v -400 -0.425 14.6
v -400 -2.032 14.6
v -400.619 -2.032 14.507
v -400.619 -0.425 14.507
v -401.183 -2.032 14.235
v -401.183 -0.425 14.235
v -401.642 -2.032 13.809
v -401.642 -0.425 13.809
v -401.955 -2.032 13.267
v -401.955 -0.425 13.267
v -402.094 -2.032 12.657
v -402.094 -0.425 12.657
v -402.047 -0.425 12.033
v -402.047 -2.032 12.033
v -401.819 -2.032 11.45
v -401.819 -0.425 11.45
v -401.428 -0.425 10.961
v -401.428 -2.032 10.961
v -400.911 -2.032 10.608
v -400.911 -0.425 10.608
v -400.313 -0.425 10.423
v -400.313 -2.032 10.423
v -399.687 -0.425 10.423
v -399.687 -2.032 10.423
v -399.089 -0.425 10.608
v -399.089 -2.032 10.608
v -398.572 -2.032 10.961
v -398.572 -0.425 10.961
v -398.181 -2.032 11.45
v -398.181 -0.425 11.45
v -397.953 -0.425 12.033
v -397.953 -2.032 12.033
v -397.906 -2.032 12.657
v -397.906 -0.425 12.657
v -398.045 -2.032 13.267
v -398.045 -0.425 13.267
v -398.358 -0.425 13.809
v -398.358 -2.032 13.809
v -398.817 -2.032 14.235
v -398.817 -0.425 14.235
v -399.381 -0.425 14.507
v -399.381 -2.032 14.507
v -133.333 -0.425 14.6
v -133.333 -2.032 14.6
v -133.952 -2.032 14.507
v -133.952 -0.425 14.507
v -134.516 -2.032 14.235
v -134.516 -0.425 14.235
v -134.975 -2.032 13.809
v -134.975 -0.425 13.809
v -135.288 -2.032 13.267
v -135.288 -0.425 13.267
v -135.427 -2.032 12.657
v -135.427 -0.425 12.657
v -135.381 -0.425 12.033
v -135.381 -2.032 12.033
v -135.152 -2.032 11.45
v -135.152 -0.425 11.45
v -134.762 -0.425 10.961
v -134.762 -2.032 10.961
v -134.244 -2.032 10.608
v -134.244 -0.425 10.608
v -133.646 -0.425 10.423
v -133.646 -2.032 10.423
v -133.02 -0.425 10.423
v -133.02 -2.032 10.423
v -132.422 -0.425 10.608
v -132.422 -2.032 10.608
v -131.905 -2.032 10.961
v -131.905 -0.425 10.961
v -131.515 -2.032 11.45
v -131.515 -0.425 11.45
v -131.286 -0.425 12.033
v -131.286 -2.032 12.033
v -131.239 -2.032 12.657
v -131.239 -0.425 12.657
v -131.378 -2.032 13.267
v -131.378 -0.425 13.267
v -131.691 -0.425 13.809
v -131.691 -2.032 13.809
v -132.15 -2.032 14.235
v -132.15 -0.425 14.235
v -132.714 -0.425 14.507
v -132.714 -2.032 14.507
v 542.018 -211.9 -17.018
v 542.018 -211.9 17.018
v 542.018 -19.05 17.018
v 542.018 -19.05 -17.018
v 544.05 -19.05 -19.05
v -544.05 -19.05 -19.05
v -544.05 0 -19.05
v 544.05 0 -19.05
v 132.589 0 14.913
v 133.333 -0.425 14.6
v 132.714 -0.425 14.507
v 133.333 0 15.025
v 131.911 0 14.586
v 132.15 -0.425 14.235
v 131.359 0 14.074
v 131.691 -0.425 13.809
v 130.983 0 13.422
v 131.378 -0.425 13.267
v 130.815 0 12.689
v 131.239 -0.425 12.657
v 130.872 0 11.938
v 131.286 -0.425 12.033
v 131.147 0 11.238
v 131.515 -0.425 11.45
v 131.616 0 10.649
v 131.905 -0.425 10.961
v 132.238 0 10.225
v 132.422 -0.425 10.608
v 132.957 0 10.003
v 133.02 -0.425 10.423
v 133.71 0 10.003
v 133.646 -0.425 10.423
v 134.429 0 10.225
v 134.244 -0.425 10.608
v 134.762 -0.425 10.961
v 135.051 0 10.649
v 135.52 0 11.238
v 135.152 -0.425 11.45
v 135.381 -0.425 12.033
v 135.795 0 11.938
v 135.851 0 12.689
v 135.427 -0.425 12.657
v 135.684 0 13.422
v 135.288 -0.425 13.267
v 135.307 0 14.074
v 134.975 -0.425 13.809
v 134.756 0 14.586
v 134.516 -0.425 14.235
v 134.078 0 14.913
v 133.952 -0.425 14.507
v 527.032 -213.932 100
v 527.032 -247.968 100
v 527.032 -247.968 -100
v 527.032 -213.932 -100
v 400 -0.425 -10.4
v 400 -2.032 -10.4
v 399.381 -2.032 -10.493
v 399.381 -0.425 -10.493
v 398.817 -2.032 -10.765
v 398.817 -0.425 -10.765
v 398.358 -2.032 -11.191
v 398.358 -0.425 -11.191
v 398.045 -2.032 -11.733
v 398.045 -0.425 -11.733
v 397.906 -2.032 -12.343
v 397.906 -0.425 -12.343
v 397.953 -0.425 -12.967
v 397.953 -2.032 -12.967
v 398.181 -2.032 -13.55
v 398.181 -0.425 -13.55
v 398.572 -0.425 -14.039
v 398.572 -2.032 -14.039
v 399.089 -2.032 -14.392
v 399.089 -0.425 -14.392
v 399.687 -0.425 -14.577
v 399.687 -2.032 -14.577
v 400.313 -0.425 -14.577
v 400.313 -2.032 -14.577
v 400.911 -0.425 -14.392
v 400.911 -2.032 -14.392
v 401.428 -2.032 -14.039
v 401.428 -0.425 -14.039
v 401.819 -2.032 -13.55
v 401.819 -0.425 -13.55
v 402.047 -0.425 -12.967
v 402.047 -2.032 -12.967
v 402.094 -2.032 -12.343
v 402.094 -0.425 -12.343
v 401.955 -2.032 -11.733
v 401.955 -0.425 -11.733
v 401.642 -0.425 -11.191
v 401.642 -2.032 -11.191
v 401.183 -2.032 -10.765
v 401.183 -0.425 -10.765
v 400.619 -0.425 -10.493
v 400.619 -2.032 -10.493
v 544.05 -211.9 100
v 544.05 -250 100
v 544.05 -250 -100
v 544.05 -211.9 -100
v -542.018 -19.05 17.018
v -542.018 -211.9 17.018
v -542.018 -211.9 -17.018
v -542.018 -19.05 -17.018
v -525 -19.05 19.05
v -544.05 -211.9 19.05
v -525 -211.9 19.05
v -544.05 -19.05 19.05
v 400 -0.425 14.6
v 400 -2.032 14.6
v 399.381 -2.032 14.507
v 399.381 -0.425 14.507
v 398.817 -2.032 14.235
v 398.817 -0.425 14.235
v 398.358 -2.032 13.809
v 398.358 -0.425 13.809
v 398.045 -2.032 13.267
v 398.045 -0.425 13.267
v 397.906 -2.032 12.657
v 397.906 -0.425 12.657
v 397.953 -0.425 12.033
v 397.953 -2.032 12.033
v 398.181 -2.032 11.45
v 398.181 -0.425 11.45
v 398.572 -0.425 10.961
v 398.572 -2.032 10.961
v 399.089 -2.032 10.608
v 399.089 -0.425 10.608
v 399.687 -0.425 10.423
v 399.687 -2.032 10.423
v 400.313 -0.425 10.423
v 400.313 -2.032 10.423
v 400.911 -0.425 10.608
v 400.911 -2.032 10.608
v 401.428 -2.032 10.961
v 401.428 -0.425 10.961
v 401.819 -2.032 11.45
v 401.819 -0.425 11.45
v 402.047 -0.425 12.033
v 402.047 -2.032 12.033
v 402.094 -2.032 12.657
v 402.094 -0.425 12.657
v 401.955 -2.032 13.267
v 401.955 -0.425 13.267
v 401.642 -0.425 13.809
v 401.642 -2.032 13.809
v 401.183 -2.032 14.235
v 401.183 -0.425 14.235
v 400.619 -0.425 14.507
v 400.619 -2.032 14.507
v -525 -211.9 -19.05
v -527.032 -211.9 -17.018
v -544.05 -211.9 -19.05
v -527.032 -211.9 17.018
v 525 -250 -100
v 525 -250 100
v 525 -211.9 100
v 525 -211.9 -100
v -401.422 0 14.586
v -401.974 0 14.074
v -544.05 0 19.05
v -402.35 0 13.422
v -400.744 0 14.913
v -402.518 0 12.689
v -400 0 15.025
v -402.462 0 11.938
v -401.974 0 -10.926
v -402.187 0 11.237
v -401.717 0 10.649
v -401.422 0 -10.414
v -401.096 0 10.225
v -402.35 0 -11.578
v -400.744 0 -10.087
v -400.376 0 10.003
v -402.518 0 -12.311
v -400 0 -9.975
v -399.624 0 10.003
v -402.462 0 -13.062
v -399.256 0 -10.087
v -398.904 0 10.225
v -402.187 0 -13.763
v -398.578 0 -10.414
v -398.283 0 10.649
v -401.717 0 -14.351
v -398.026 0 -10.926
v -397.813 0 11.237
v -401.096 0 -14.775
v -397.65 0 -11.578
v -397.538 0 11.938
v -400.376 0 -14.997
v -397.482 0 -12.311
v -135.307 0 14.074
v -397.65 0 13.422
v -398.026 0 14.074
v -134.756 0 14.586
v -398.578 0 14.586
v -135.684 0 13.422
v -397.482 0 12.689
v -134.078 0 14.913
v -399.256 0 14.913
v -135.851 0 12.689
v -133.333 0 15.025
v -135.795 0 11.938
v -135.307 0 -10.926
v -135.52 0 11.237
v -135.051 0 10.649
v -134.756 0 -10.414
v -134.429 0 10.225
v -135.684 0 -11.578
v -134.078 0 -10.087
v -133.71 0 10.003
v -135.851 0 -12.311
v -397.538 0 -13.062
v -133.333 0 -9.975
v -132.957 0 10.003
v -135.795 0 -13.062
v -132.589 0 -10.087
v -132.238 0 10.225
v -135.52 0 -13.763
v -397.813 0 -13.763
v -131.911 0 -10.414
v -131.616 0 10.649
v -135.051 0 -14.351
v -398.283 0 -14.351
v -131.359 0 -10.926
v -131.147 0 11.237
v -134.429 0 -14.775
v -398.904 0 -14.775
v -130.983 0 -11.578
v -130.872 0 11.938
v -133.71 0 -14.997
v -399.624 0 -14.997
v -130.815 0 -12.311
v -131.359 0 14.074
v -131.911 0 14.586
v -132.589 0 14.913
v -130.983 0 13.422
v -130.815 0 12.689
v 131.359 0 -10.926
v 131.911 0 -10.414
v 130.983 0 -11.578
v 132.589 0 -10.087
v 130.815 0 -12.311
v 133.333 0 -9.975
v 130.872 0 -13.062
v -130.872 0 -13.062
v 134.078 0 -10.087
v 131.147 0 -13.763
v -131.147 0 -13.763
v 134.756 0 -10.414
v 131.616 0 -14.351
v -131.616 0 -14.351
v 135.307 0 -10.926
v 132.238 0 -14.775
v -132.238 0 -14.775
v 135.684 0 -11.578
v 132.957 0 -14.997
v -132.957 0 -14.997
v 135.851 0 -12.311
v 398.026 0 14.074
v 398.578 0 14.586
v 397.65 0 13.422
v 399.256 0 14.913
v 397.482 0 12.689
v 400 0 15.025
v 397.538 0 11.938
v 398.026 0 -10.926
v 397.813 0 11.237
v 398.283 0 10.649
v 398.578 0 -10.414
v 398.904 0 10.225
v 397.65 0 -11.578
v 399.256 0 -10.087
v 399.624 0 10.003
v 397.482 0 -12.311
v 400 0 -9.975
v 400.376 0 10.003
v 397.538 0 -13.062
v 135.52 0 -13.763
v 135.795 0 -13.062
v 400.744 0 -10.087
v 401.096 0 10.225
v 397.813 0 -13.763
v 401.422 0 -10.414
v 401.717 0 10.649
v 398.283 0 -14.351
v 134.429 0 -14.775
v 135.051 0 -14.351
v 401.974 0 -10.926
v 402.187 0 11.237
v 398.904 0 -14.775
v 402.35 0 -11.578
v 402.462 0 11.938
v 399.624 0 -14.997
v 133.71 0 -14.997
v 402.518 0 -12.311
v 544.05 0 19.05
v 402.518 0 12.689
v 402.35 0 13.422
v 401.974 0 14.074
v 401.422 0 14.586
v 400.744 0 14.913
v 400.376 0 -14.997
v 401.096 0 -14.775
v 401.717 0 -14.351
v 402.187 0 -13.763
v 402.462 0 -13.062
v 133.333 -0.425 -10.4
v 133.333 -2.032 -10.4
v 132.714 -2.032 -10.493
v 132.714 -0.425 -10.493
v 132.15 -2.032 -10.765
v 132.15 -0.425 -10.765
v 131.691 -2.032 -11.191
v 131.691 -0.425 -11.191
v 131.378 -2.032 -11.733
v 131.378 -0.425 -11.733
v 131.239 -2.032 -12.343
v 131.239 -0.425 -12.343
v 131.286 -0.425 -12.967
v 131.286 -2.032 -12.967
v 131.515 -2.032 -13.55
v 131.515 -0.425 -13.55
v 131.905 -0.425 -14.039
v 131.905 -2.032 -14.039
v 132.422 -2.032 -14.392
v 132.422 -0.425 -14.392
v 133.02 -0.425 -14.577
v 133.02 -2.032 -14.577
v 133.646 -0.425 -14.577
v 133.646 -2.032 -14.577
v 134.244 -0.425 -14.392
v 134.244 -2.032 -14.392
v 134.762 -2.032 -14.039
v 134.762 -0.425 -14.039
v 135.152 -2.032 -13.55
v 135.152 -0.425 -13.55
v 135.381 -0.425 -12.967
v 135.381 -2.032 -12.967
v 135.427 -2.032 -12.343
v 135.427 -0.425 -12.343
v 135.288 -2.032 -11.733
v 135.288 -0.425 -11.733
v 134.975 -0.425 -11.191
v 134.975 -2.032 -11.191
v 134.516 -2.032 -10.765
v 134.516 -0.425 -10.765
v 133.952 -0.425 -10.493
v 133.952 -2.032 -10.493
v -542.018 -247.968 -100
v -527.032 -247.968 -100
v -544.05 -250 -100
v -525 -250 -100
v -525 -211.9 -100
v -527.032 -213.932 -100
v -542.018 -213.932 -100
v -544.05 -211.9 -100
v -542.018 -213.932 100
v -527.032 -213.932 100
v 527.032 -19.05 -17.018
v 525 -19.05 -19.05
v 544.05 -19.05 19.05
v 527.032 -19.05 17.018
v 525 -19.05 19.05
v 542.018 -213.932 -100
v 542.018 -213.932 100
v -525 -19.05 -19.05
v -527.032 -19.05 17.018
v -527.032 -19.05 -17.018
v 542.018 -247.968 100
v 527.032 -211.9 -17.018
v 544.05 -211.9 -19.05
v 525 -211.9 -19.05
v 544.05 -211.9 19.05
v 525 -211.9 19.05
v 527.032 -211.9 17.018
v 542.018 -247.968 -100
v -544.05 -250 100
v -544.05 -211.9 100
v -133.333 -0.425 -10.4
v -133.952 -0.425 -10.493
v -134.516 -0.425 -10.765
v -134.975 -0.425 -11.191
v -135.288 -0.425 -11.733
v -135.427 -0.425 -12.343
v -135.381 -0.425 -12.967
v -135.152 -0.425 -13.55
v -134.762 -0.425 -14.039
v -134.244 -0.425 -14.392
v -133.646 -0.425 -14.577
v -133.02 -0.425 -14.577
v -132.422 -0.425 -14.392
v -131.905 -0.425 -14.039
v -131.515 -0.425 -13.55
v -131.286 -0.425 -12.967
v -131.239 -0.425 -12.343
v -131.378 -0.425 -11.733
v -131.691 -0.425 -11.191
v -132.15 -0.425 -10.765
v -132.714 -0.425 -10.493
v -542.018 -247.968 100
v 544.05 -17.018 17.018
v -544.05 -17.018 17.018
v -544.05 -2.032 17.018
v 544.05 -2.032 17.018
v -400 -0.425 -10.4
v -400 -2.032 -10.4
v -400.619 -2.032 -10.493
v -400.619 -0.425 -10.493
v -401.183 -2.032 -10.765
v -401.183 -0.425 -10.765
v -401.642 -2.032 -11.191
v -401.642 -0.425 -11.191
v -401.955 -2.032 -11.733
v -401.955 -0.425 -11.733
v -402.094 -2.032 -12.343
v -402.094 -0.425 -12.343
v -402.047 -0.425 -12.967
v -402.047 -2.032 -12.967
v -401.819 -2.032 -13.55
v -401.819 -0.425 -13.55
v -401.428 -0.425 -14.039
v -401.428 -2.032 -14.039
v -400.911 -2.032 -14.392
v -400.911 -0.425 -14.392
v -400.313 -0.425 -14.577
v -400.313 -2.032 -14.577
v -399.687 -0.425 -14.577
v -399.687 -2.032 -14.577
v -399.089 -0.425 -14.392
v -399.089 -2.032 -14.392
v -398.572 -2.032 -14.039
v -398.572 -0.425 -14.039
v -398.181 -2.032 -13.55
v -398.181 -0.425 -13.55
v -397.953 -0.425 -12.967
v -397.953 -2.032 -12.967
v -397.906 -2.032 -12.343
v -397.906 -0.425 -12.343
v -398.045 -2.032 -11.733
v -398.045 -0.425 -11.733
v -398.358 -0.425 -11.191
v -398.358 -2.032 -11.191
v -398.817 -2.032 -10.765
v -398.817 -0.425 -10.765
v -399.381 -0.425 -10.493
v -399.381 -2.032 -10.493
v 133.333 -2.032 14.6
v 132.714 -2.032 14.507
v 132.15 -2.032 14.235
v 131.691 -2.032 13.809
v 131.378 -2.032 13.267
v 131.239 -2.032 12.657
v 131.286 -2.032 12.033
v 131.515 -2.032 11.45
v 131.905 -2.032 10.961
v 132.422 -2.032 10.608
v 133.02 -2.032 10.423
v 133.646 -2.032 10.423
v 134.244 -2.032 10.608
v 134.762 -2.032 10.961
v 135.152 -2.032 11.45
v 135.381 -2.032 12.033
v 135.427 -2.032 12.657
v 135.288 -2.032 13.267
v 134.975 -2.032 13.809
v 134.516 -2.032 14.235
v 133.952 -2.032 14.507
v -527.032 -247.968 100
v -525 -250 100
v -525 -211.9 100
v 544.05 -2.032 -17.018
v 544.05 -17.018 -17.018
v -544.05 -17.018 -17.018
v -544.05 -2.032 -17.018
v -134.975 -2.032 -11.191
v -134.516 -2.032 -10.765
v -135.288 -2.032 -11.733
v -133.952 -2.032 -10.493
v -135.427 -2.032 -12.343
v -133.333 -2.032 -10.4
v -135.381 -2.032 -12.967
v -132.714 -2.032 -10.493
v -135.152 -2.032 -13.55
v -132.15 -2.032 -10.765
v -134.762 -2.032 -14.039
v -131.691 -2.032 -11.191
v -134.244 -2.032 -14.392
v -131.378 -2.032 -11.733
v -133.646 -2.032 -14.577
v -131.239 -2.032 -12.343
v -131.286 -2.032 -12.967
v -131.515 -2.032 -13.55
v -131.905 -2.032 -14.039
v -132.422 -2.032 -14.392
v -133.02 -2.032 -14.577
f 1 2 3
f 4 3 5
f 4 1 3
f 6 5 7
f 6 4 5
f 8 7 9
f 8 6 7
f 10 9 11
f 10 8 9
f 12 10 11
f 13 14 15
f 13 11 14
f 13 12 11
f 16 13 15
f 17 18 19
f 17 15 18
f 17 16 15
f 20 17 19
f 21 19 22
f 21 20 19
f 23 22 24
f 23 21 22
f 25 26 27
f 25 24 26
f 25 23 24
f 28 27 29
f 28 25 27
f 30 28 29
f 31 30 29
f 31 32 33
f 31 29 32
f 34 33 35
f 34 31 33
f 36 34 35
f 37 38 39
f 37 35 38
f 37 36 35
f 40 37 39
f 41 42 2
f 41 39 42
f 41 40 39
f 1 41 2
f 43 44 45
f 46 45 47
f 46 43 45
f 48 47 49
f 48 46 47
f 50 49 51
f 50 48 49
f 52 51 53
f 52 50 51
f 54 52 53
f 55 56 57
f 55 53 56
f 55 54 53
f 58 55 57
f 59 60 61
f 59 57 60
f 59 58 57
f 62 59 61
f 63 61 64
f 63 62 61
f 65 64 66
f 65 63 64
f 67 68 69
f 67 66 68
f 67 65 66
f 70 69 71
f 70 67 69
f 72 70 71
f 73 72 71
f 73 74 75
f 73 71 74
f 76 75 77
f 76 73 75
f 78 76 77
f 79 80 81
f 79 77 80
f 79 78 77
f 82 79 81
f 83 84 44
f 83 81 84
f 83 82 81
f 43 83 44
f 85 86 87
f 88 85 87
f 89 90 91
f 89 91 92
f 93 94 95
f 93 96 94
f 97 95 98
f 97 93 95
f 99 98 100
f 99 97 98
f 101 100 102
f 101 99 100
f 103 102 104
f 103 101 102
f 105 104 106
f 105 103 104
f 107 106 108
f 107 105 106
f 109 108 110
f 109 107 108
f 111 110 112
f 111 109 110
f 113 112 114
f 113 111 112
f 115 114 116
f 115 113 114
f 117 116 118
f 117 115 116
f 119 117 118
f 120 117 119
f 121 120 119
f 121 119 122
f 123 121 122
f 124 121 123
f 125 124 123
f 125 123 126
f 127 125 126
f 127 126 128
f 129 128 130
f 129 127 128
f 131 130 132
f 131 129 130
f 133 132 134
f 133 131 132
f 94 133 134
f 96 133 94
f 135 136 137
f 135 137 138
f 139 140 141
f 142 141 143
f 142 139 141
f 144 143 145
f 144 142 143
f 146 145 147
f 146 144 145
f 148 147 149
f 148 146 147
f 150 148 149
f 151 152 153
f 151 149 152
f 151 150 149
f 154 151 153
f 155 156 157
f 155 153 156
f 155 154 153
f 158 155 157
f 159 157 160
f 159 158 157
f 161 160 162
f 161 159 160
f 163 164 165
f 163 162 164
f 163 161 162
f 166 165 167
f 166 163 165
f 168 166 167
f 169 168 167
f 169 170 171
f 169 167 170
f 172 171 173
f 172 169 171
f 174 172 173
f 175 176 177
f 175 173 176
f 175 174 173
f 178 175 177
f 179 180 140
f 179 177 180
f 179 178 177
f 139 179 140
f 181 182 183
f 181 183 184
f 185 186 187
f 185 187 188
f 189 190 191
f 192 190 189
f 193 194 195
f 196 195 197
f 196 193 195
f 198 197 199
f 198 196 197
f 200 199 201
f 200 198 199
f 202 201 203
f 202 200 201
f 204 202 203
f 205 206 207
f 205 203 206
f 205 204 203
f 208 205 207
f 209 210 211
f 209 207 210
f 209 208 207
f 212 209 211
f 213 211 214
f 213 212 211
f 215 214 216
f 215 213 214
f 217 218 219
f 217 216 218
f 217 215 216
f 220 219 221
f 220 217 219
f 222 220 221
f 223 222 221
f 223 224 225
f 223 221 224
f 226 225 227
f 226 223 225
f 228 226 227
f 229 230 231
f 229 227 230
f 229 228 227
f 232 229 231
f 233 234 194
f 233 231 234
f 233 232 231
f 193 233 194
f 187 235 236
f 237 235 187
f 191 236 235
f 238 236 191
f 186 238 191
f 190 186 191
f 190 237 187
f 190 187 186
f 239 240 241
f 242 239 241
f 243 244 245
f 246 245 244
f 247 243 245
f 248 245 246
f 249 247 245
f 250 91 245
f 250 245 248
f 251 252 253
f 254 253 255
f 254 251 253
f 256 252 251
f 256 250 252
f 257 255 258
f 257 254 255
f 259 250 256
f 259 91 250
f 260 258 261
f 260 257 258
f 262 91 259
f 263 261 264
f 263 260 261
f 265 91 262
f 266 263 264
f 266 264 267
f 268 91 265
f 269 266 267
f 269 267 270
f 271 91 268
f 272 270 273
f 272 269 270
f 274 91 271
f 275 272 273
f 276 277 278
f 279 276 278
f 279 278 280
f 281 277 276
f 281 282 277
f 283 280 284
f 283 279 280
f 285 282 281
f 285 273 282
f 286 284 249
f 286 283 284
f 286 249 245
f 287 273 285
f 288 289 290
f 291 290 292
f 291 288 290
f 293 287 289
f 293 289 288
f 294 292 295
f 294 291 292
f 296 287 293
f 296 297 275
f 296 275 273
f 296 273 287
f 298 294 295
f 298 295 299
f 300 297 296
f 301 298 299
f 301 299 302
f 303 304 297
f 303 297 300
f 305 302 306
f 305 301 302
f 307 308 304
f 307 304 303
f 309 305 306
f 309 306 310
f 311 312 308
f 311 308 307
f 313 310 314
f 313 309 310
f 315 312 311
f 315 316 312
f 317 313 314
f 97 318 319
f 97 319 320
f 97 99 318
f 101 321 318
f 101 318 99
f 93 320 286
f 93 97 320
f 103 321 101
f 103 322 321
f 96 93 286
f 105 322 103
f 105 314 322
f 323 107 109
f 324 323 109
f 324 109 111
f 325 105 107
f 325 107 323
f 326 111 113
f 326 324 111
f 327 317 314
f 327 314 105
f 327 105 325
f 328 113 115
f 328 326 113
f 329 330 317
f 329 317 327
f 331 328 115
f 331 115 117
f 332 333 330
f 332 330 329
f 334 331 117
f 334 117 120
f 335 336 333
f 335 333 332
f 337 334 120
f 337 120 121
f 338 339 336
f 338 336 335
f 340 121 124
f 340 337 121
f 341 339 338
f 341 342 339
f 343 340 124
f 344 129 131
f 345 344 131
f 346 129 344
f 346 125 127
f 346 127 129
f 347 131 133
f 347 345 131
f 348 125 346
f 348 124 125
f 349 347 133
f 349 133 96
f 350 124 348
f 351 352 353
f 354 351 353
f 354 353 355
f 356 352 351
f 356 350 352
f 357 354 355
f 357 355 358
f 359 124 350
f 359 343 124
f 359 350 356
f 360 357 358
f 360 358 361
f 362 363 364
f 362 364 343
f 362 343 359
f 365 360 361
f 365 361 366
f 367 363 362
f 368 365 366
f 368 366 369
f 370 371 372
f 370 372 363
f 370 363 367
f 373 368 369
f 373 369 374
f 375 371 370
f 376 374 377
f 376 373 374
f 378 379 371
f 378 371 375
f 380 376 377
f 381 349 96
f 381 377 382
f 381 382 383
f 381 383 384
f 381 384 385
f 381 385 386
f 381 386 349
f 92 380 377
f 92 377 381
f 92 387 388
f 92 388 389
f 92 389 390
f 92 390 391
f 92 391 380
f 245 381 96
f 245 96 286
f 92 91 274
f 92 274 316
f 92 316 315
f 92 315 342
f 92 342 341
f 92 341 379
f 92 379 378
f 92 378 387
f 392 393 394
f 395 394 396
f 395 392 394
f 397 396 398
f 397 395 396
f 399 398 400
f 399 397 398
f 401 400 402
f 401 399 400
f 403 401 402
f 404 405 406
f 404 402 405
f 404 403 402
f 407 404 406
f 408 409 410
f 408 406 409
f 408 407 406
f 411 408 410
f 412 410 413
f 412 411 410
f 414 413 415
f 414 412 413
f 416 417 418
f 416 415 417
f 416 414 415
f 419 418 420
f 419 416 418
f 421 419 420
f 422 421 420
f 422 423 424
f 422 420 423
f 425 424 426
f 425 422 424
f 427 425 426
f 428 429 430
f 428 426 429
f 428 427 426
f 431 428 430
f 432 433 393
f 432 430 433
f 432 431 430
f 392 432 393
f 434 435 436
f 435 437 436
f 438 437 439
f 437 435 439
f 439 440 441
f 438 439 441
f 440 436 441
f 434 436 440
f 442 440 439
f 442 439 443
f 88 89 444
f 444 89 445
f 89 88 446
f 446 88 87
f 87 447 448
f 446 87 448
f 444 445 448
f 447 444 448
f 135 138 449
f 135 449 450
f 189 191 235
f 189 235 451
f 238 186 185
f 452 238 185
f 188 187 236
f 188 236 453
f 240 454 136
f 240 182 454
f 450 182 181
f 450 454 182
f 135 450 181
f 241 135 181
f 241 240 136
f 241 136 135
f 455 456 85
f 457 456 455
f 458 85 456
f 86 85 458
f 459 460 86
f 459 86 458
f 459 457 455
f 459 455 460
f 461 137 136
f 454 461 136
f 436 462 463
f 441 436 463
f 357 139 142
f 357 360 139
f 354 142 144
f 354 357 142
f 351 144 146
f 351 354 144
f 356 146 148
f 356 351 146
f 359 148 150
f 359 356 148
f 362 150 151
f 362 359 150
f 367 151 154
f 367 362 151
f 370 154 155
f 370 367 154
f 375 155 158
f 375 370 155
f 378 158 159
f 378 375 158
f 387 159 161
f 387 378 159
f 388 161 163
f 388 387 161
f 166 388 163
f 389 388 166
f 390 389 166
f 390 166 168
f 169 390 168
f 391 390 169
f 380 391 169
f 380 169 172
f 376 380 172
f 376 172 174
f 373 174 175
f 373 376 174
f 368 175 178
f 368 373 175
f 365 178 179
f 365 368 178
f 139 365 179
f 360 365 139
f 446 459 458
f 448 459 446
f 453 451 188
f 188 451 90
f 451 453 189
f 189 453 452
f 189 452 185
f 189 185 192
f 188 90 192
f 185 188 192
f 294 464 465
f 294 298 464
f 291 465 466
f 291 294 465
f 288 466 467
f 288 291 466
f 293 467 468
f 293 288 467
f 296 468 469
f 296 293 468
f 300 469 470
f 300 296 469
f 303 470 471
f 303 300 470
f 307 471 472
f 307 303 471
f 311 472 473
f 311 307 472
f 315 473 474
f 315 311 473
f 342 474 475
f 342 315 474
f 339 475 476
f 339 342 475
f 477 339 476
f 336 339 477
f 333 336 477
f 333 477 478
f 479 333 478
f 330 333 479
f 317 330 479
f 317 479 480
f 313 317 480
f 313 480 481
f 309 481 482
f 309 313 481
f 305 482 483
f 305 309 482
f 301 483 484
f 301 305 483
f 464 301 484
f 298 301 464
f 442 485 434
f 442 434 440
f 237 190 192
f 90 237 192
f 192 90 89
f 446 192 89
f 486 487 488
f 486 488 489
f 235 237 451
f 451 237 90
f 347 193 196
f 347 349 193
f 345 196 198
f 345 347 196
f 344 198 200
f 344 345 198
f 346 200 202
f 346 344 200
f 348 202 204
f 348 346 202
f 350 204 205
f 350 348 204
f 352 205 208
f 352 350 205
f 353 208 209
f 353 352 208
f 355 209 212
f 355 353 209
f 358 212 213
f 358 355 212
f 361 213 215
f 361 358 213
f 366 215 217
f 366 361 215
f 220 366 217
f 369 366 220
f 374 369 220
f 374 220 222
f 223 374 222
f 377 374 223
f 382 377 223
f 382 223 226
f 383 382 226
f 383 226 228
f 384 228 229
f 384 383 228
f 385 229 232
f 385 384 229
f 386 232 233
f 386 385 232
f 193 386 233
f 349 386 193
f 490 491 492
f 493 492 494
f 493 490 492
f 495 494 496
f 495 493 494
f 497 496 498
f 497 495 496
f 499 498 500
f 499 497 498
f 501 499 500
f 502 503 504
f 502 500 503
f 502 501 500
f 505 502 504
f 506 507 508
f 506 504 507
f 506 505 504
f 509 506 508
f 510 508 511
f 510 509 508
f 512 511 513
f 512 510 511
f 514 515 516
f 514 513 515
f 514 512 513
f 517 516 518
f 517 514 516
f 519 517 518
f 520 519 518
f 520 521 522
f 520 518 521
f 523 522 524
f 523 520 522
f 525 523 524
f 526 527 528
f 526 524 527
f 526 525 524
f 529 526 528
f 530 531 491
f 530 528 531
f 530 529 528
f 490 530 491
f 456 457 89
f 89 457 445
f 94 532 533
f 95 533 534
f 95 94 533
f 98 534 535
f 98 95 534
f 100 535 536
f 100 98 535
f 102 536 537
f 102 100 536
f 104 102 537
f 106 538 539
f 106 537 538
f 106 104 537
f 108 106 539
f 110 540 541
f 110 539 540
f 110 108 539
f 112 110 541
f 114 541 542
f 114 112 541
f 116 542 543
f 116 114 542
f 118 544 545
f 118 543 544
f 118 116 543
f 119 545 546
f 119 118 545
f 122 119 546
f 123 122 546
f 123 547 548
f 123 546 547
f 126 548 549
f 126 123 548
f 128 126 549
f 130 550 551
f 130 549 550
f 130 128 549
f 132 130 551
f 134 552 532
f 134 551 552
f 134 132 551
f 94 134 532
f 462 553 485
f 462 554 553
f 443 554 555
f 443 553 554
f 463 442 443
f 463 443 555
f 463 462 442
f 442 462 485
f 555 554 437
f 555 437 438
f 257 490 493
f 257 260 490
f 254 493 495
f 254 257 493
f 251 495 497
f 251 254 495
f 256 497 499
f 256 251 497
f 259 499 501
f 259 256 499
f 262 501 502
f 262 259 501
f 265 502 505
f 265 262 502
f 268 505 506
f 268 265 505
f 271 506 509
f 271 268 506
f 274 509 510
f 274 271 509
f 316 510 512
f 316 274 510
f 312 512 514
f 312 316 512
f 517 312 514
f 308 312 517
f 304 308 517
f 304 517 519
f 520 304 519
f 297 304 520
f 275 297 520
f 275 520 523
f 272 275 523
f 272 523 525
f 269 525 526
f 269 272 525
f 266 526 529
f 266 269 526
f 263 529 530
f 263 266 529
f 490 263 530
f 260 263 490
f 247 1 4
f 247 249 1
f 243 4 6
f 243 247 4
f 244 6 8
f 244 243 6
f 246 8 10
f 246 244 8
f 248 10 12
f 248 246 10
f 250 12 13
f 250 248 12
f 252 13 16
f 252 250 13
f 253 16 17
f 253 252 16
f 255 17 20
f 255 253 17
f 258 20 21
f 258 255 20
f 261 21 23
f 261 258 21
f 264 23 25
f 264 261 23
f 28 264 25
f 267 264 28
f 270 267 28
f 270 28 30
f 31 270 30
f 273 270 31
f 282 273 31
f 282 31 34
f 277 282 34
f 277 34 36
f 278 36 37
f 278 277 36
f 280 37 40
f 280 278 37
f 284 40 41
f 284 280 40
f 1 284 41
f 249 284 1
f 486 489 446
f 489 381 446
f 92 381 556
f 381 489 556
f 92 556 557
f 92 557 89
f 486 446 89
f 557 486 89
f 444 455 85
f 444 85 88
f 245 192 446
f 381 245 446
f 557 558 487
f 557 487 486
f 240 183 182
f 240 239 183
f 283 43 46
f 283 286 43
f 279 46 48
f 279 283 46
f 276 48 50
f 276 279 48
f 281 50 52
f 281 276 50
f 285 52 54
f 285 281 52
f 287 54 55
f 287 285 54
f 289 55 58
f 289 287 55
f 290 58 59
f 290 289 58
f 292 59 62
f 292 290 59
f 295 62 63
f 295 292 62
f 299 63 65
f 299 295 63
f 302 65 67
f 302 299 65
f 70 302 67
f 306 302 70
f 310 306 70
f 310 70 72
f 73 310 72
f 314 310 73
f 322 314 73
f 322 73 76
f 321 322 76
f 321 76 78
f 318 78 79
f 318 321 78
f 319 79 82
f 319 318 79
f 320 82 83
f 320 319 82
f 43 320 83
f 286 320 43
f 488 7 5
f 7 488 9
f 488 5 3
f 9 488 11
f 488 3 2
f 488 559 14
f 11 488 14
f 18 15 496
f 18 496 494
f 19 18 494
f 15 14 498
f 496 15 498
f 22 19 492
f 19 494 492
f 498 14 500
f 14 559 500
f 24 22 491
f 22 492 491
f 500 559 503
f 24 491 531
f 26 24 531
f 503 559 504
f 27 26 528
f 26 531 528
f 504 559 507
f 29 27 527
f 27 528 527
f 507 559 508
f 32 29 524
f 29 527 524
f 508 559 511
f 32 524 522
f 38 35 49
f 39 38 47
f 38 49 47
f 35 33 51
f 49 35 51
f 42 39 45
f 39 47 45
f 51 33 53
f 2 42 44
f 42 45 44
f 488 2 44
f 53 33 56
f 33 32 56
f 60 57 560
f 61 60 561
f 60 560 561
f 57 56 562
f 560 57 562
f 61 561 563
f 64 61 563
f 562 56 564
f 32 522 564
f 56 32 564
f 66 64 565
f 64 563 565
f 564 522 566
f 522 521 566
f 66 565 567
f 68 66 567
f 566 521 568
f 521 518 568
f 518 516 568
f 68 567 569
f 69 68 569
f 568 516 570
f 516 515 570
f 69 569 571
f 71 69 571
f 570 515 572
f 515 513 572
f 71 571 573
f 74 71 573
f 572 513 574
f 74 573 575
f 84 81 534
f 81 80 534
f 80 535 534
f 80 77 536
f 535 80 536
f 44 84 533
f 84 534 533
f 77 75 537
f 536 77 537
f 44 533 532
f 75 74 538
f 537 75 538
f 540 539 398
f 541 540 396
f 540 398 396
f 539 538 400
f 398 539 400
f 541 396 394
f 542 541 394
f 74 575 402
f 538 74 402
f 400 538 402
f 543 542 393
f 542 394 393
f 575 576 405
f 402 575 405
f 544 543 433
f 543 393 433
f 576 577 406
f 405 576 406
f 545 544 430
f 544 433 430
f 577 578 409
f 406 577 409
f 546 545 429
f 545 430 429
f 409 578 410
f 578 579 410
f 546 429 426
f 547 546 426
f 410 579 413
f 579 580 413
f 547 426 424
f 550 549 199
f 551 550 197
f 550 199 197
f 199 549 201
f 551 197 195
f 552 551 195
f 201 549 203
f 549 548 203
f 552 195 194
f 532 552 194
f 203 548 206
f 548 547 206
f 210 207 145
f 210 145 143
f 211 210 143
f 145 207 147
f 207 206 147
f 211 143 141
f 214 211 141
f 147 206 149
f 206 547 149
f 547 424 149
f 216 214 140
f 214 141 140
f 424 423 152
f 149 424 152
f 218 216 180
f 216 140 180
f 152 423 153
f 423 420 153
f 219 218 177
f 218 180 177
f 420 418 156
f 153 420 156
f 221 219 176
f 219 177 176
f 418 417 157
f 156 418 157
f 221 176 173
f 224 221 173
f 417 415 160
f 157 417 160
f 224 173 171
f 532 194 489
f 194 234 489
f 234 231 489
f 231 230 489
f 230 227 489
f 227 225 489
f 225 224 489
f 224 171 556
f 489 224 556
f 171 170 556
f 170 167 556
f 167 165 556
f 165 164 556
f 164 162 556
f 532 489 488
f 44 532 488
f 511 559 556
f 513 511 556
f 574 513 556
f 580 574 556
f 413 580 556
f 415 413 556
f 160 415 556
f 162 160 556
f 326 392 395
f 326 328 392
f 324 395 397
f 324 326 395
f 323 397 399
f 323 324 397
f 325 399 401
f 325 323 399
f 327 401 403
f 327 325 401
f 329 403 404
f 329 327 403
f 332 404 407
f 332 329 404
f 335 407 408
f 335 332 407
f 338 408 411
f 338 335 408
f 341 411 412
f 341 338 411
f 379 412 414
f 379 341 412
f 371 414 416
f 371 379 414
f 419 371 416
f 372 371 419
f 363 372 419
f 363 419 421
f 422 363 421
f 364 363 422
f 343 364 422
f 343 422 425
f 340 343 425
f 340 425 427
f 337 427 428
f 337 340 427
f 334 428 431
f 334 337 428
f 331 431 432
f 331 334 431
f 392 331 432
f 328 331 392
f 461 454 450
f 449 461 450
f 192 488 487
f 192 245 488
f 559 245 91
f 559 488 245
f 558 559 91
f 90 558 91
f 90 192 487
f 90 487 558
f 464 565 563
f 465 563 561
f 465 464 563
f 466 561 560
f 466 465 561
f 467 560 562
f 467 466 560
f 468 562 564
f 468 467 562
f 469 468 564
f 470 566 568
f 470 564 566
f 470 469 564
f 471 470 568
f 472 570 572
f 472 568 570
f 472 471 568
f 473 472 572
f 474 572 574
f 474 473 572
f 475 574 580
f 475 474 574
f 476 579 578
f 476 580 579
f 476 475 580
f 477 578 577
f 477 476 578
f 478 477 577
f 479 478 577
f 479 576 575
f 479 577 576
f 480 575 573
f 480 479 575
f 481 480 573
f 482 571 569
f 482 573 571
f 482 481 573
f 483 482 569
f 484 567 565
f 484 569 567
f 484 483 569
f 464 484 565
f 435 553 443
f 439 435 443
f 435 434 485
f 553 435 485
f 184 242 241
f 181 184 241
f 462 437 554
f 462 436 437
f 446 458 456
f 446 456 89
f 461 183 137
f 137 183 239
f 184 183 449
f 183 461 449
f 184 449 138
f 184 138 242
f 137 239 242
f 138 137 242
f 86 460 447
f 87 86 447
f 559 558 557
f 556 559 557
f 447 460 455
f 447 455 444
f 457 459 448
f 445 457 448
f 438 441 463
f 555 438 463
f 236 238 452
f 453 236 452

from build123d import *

# Parameters (mm, degrees)
AL_START                                       = -544.05
AL_TUBE_RECTANGULAR_AL_TUBE_3_X_1_5_2_W        = 192.85
AL_TUBE_RECTANGULAR_AL_TUBE_3_X_1_5_2_H        = 38.1
AL_TUBE_RECTANGULAR_AL_TUBE_3_X_1_5_RECT_DEPTH = 2.032
AL_START_2                                     = -527.032
AL_TUBE_RECTANGULAR_AL_TUBE_3_X_1_5_3_OU_W     = 192.85
AL_TUBE_RECTANGULAR_AL_TUBE_3_X_1_5_3_OU_H     = 38.1
AL_TUBE_RECTANGULAR_AL_TUBE_3_X_1_5_3_DEPTH    = 2.032
AL_START_3                                     = -542.018
AL_TUBE_RECTANGULAR_AL_TUBE_3_X_1_5_4_OU_W     = 192.85
AL_TUBE_RECTANGULAR_AL_TUBE_3_X_1_5_4_OU_H     = 2.032
AL_TUBE_RECTANGULAR_AL_TUBE_3_X_1_5_4_DEPTH    = 14.986
AL_START_4                                     = -19.05
AL_TUBE_RECTANGULAR_AL_TUBE_3_X_1_5_5_OU_W     = 1088.1
AL_TUBE_RECTANGULAR_AL_TUBE_3_X_1_5_5_OU_H     = 38.1
AL_TUBE_RECTANGULAR_AL_TUBE_3_X_1_5_5_DEPTH    = 2.032
AL_START_5                                     = -2.032
AL_TUBE_RECTANGULAR_AL_TUBE_3_X_1_5_6_OU_W     = 1088.1
AL_TUBE_RECTANGULAR_AL_TUBE_3_X_1_5_6_OU_H     = 38.1
AL_TUBE_RECTANGULAR_AL_TUBE_3_X_1_5_6_DEPTH    = 2.032
AL_START_6                                     = -17.018
AL_TUBE_RECTANGULAR_AL_TUBE_3_X_1_5_7_OU_W     = 1088.1
AL_TUBE_RECTANGULAR_AL_TUBE_3_X_1_5_7_OU_H     = 2.032
AL_TUBE_RECTANGULAR_AL_TUBE_3_X_1_5_7_DEPTH    = 14.986
AL_START_7                                     = 525
AL_TUBE_RECTANGULAR_AL_TUBE_3_X_1_5_8_OU_W     = 192.85
AL_TUBE_RECTANGULAR_AL_TUBE_3_X_1_5_8_OU_H     = 38.1
AL_TUBE_RECTANGULAR_AL_TUBE_3_X_1_5_8_DEPTH    = 2.032
AL_START_8                                     = 542.018
AL_TUBE_RECTANGULAR_AL_TUBE_3_X_1_5_9_OU_W     = 192.85
AL_TUBE_RECTANGULAR_AL_TUBE_3_X_1_5_9_OU_H     = 38.1
AL_TUBE_RECTANGULAR_AL_TUBE_3_X_1_5_9_DEPTH    = 2.032
AL_START_9                                     = 527.032
AL_TUBE_RECTANGULAR_AL_TUBE_3_X_1_5_10_O_W     = 192.85
AL_TUBE_RECTANGULAR_AL_TUBE_3_X_1_5_10_O_H     = 2.032
AL_TUBE_RECTANGULAR_AL_TUBE_3_X_1_5_10_DEPTH   = 14.986
AL_TUBE_RECTANGULAR_AL_TUBE_3_X_1_5_11_O_W     = 38.1
AL_TUBE_RECTANGULAR_AL_TUBE_3_X_1_5_11_O_H     = 200
AL_TUBE_RECTANGULAR_AL_TUBE_3_X_1_5_11_DEPTH   = 2.032
AL_TUBE_RECTANGULAR_AL_TUBE_3_X_1_5_12_O_W     = 38.1
AL_TUBE_RECTANGULAR_AL_TUBE_3_X_1_5_12_O_H     = 200
AL_TUBE_RECTANGULAR_AL_TUBE_3_X_1_5_12_DEPTH   = 2.032
AL_TUBE_RECTANGULAR_AL_TUBE_3_X_1_5_13_O_W     = 2.032
AL_TUBE_RECTANGULAR_AL_TUBE_3_X_1_5_13_O_H     = 200
AL_TUBE_RECTANGULAR_AL_TUBE_3_X_1_5_13_DEPTH   = 14.986
AL_TUBE_RECTANGULAR_AL_TUBE_3_X_1_5_14_O_W     = 38.1
AL_TUBE_RECTANGULAR_AL_TUBE_3_X_1_5_14_O_H     = 200
AL_TUBE_RECTANGULAR_AL_TUBE_3_X_1_5_14_DEPTH   = 2.032
AL_TUBE_RECTANGULAR_AL_TUBE_3_X_1_5_15_O_W     = 38.1
AL_TUBE_RECTANGULAR_AL_TUBE_3_X_1_5_15_O_H     = 200
AL_TUBE_RECTANGULAR_AL_TUBE_3_X_1_5_15_DEPTH   = 2.032
AL_TUBE_RECTANGULAR_AL_TUBE_3_X_1_5_16_O_W     = 2.032
AL_TUBE_RECTANGULAR_AL_TUBE_3_X_1_5_16_O_H     = 200
AL_TUBE_RECTANGULAR_AL_TUBE_3_X_1_5_16_DEPTH   = 14.986
TROU_TARAUD_M5X0_81_AT_2_COUNT                 = 2
TROU_TARAUD_M5X0_81_AT_2_PITCH                 = 800
TROU_TARAUD_M5X0_81_AT_3_COUNT                 = 2
TROU_TARAUD_M5X0_81_AT_3_PITCH                 = 800.390529679
TROU_TARAUD_M5X0_81_AT_4_COUNT                 = 2
TROU_TARAUD_M5X0_81_AT_4_PITCH                 = 533.918949321
TROU_TARAUD_M5X0_81_AT_5_COUNT                 = 2
TROU_TARAUD_M5X0_81_AT_5_PITCH                 = 533.333333333
TROU_TARAUD_M5X0_81_AT_6_COUNT                 = 2
TROU_TARAUD_M5X0_81_AT_6_PITCH                 = 266.666666667
TROU_TARAUD_M5X0_81_AT_7_COUNT                 = 2
TROU_TARAUD_M5X0_81_AT_7_PITCH                 = 267.835978
TROU_TARAUD_M5X0_81_AT_8_COUNT                 = 2
TROU_TARAUD_M5X0_81_AT_8_PITCH                 = 25


# Read off the part's stored shape, not the designer's step: Al tube rectangular AL TUBE 3 X 1.5 RECT X 0.104 WALL(4)
with BuildPart() as part:
    # Al tube rectangular AL TUBE 3 X 1.5  2 → Al tube rectangular AL TUBE 3 X 1.5 RECT X 0.104 WALL(4) (new body)
    with BuildSketch(Plane.YZ.offset(AL_START)):
        with Locations((-115.475, 0)):
            Rectangle(AL_TUBE_RECTANGULAR_AL_TUBE_3_X_1_5_2_W, AL_TUBE_RECTANGULAR_AL_TUBE_3_X_1_5_2_H)
    extrude(amount=AL_TUBE_RECTANGULAR_AL_TUBE_3_X_1_5_RECT_DEPTH)

    # Al tube rectangular AL TUBE 3 X 1.5 3 ou → Al tube rectangular AL TUBE 3 X 1.5  3 (add)
    with BuildSketch(Plane.YZ.offset(AL_START_2)):
        with Locations((-115.475, 0)):
            Rectangle(AL_TUBE_RECTANGULAR_AL_TUBE_3_X_1_5_3_OU_W, AL_TUBE_RECTANGULAR_AL_TUBE_3_X_1_5_3_OU_H)
    extrude(amount=AL_TUBE_RECTANGULAR_AL_TUBE_3_X_1_5_3_DEPTH)

    # Al tube rectangular AL TUBE 3 X 1.5 4 ou → Al tube rectangular AL TUBE 3 X 1.5  4 (add)
    with BuildSketch(Plane.YZ.offset(AL_START_3)):
        with Locations((-115.475, 18.034)):
            Rectangle(AL_TUBE_RECTANGULAR_AL_TUBE_3_X_1_5_4_OU_W, AL_TUBE_RECTANGULAR_AL_TUBE_3_X_1_5_4_OU_H)
        with Locations((-115.475, -18.034)):
            Rectangle(AL_TUBE_RECTANGULAR_AL_TUBE_3_X_1_5_4_OU_W, AL_TUBE_RECTANGULAR_AL_TUBE_3_X_1_5_4_OU_H)
    extrude(amount=AL_TUBE_RECTANGULAR_AL_TUBE_3_X_1_5_4_DEPTH)


with BuildPart() as body_2:
    # Al tube rectangular AL TUBE 3 X 1.5 5 ou → Al tube rectangular AL TUBE 3 X 1.5  5 (new body)
    with BuildSketch(Plane(origin=(0, 0, 0), x_dir=(1, 0, 0), z_dir=(0, 1, 0)).offset(AL_START_4)):
        Rectangle(AL_TUBE_RECTANGULAR_AL_TUBE_3_X_1_5_5_OU_W, AL_TUBE_RECTANGULAR_AL_TUBE_3_X_1_5_5_OU_H)
    extrude(amount=AL_TUBE_RECTANGULAR_AL_TUBE_3_X_1_5_5_DEPTH)

    # Al tube rectangular AL TUBE 3 X 1.5 6 ou → Al tube rectangular AL TUBE 3 X 1.5  6 (add)
    with BuildSketch(Plane(origin=(0, 0, 0), x_dir=(1, 0, 0), z_dir=(0, 1, 0)).offset(AL_START_5)):
        Rectangle(AL_TUBE_RECTANGULAR_AL_TUBE_3_X_1_5_6_OU_W, AL_TUBE_RECTANGULAR_AL_TUBE_3_X_1_5_6_OU_H)
    extrude(amount=AL_TUBE_RECTANGULAR_AL_TUBE_3_X_1_5_6_DEPTH)

    # Al tube rectangular AL TUBE 3 X 1.5 7 ou → Al tube rectangular AL TUBE 3 X 1.5  7 (add)
    with BuildSketch(Plane(origin=(0, 0, 0), x_dir=(1, 0, 0), z_dir=(0, 1, 0)).offset(AL_START_6)):
        with Locations((0, 18.034)):
            Rectangle(AL_TUBE_RECTANGULAR_AL_TUBE_3_X_1_5_7_OU_W, AL_TUBE_RECTANGULAR_AL_TUBE_3_X_1_5_7_OU_H)
        with Locations((0, -18.034)):
            Rectangle(AL_TUBE_RECTANGULAR_AL_TUBE_3_X_1_5_7_OU_W, AL_TUBE_RECTANGULAR_AL_TUBE_3_X_1_5_7_OU_H)
    extrude(amount=AL_TUBE_RECTANGULAR_AL_TUBE_3_X_1_5_7_DEPTH)

    # Esquisse2 → Trou taraudé M5x0.81 (revolve, cut)
    with BuildSketch(Plane(origin=(400, 0, -12.5), x_dir=(0, 0, 1), z_dir=(1, 0, 0))):
        Polygon((0, 0), (0, 2.033), (2.1, 2.033), (2.1, 0.425), (2.525, 0), align=None)
    trou_taraud_m5x0_81 = revolve(axis=Axis((400, 6.35, -12.5), (0, -1, 0)), mode=Mode.SUBTRACT)

    # Trou taraudé M5x0.81 at 2: Trou taraudé M5x0.81 ×2
    with Locations(*[(-i * TROU_TARAUD_M5X0_81_AT_2_PITCH, 0, 0) for i in range(1, TROU_TARAUD_M5X0_81_AT_2_COUNT)]):
        add(trou_taraud_m5x0_81, mode=Mode.SUBTRACT)

    # Trou taraudé M5x0.81 at 3: Trou taraudé M5x0.81 ×2
    with Locations(*[Vector(-0.9995120760870788, 0, 0.031234752377721213) * (i * TROU_TARAUD_M5X0_81_AT_3_PITCH) for i in range(1, TROU_TARAUD_M5X0_81_AT_3_COUNT)]):
        add(trou_taraud_m5x0_81, mode=Mode.SUBTRACT)

    # Trou taraudé M5x0.81 at 4: Trou taraudé M5x0.81 ×2
    with Locations(*[Vector(-0.998903174369838, 0, 0.04682358629858615) * (i * TROU_TARAUD_M5X0_81_AT_4_PITCH) for i in range(1, TROU_TARAUD_M5X0_81_AT_4_COUNT)]):
        add(trou_taraud_m5x0_81, mode=Mode.SUBTRACT)

    # Trou taraudé M5x0.81 at 5: Trou taraudé M5x0.81 ×2
    with Locations(*[(-i * TROU_TARAUD_M5X0_81_AT_5_PITCH, 0, 0) for i in range(1, TROU_TARAUD_M5X0_81_AT_5_COUNT)]):
        add(trou_taraud_m5x0_81, mode=Mode.SUBTRACT)

    # Trou taraudé M5x0.81 at 6: Trou taraudé M5x0.81 ×2
    with Locations(*[(-i * TROU_TARAUD_M5X0_81_AT_6_PITCH, 0, 0) for i in range(1, TROU_TARAUD_M5X0_81_AT_6_COUNT)]):
        add(trou_taraud_m5x0_81, mode=Mode.SUBTRACT)

    # Trou taraudé M5x0.81 at 7: Trou taraudé M5x0.81 ×2
    with Locations(*[Vector(-0.9956342260592882, 0, 0.09334070869305829) * (i * TROU_TARAUD_M5X0_81_AT_7_PITCH) for i in range(1, TROU_TARAUD_M5X0_81_AT_7_COUNT)]):
        add(trou_taraud_m5x0_81, mode=Mode.SUBTRACT)

    # Trou taraudé M5x0.81 at 8: Trou taraudé M5x0.81 ×2
    with Locations(*[(0, 0, i * TROU_TARAUD_M5X0_81_AT_8_PITCH) for i in range(1, TROU_TARAUD_M5X0_81_AT_8_COUNT)]):
        add(trou_taraud_m5x0_81, mode=Mode.SUBTRACT)


with BuildPart() as body_3:
    # Al tube rectangular AL TUBE 3 X 1.5 8 ou → Al tube rectangular AL TUBE 3 X 1.5  8 (new body)
    with BuildSketch(Plane.YZ.offset(AL_START_7)):
        with Locations((-115.475, 0)):
            Rectangle(AL_TUBE_RECTANGULAR_AL_TUBE_3_X_1_5_8_OU_W, AL_TUBE_RECTANGULAR_AL_TUBE_3_X_1_5_8_OU_H)
    extrude(amount=AL_TUBE_RECTANGULAR_AL_TUBE_3_X_1_5_8_DEPTH)

    # Al tube rectangular AL TUBE 3 X 1.5 9 ou → Al tube rectangular AL TUBE 3 X 1.5  9 (add)
    with BuildSketch(Plane.YZ.offset(AL_START_8)):
        with Locations((-115.475, 0)):
            Rectangle(AL_TUBE_RECTANGULAR_AL_TUBE_3_X_1_5_9_OU_W, AL_TUBE_RECTANGULAR_AL_TUBE_3_X_1_5_9_OU_H)
    extrude(amount=AL_TUBE_RECTANGULAR_AL_TUBE_3_X_1_5_9_DEPTH)

    # Al tube rectangular AL TUBE 3 X 1.5 10 o → Al tube rectangular AL TUBE 3 X 1.5  10 (add)
    with BuildSketch(Plane.YZ.offset(AL_START_9)):
        with Locations((-115.475, 18.034)):
            Rectangle(AL_TUBE_RECTANGULAR_AL_TUBE_3_X_1_5_10_O_W, AL_TUBE_RECTANGULAR_AL_TUBE_3_X_1_5_10_O_H)
        with Locations((-115.475, -18.034)):
            Rectangle(AL_TUBE_RECTANGULAR_AL_TUBE_3_X_1_5_10_O_W, AL_TUBE_RECTANGULAR_AL_TUBE_3_X_1_5_10_O_H)
    extrude(amount=AL_TUBE_RECTANGULAR_AL_TUBE_3_X_1_5_10_DEPTH)


with BuildPart() as body_4:
    # Al tube rectangular AL TUBE 3 X 1.5 11 o → Al tube rectangular AL TUBE 3 X 1.5  11 (new body)
    with BuildSketch(Plane.YZ.offset(AL_START_7)):
        with Locations((-230.95, 0)):
            Rectangle(AL_TUBE_RECTANGULAR_AL_TUBE_3_X_1_5_11_O_W, AL_TUBE_RECTANGULAR_AL_TUBE_3_X_1_5_11_O_H)
    extrude(amount=AL_TUBE_RECTANGULAR_AL_TUBE_3_X_1_5_11_DEPTH)

    # Al tube rectangular AL TUBE 3 X 1.5 12 o → Al tube rectangular AL TUBE 3 X 1.5  12 (add)
    with BuildSketch(Plane.YZ.offset(AL_START_8)):
        with Locations((-230.95, 0)):
            Rectangle(AL_TUBE_RECTANGULAR_AL_TUBE_3_X_1_5_12_O_W, AL_TUBE_RECTANGULAR_AL_TUBE_3_X_1_5_12_O_H)
    extrude(amount=AL_TUBE_RECTANGULAR_AL_TUBE_3_X_1_5_12_DEPTH)

    # Al tube rectangular AL TUBE 3 X 1.5 13 o → Al tube rectangular AL TUBE 3 X 1.5  13 (add)
    with BuildSketch(Plane.YZ.offset(AL_START_9)):
        with Locations((-248.984, 0)):
            Rectangle(AL_TUBE_RECTANGULAR_AL_TUBE_3_X_1_5_13_O_W, AL_TUBE_RECTANGULAR_AL_TUBE_3_X_1_5_13_O_H)
        with Locations((-212.916, 0)):
            Rectangle(AL_TUBE_RECTANGULAR_AL_TUBE_3_X_1_5_13_O_W, AL_TUBE_RECTANGULAR_AL_TUBE_3_X_1_5_13_O_H)
    extrude(amount=AL_TUBE_RECTANGULAR_AL_TUBE_3_X_1_5_13_DEPTH)


with BuildPart() as body_5:
    # Al tube rectangular AL TUBE 3 X 1.5 14 o → Al tube rectangular AL TUBE 3 X 1.5  14 (new body)
    with BuildSketch(Plane.YZ.offset(AL_START)):
        with Locations((-230.95, 0)):
            Rectangle(AL_TUBE_RECTANGULAR_AL_TUBE_3_X_1_5_14_O_W, AL_TUBE_RECTANGULAR_AL_TUBE_3_X_1_5_14_O_H)
    extrude(amount=AL_TUBE_RECTANGULAR_AL_TUBE_3_X_1_5_14_DEPTH)

    # Al tube rectangular AL TUBE 3 X 1.5 15 o → Al tube rectangular AL TUBE 3 X 1.5  15 (add)
    with BuildSketch(Plane.YZ.offset(AL_START_2)):
        with Locations((-230.95, 0)):
            Rectangle(AL_TUBE_RECTANGULAR_AL_TUBE_3_X_1_5_15_O_W, AL_TUBE_RECTANGULAR_AL_TUBE_3_X_1_5_15_O_H)
    extrude(amount=AL_TUBE_RECTANGULAR_AL_TUBE_3_X_1_5_15_DEPTH)

    # Al tube rectangular AL TUBE 3 X 1.5 16 o → Al tube rectangular AL TUBE 3 X 1.5  16 (add)
    with BuildSketch(Plane.YZ.offset(AL_START_3)):
        with Locations((-248.984, 0)):
            Rectangle(AL_TUBE_RECTANGULAR_AL_TUBE_3_X_1_5_16_O_W, AL_TUBE_RECTANGULAR_AL_TUBE_3_X_1_5_16_O_H)
        with Locations((-212.916, 0)):
            Rectangle(AL_TUBE_RECTANGULAR_AL_TUBE_3_X_1_5_16_O_W, AL_TUBE_RECTANGULAR_AL_TUBE_3_X_1_5_16_O_H)
    extrude(amount=AL_TUBE_RECTANGULAR_AL_TUBE_3_X_1_5_16_DEPTH)


solid = Compound([part.part, body_2.part, body_3.part, body_4.part, body_5.part])
